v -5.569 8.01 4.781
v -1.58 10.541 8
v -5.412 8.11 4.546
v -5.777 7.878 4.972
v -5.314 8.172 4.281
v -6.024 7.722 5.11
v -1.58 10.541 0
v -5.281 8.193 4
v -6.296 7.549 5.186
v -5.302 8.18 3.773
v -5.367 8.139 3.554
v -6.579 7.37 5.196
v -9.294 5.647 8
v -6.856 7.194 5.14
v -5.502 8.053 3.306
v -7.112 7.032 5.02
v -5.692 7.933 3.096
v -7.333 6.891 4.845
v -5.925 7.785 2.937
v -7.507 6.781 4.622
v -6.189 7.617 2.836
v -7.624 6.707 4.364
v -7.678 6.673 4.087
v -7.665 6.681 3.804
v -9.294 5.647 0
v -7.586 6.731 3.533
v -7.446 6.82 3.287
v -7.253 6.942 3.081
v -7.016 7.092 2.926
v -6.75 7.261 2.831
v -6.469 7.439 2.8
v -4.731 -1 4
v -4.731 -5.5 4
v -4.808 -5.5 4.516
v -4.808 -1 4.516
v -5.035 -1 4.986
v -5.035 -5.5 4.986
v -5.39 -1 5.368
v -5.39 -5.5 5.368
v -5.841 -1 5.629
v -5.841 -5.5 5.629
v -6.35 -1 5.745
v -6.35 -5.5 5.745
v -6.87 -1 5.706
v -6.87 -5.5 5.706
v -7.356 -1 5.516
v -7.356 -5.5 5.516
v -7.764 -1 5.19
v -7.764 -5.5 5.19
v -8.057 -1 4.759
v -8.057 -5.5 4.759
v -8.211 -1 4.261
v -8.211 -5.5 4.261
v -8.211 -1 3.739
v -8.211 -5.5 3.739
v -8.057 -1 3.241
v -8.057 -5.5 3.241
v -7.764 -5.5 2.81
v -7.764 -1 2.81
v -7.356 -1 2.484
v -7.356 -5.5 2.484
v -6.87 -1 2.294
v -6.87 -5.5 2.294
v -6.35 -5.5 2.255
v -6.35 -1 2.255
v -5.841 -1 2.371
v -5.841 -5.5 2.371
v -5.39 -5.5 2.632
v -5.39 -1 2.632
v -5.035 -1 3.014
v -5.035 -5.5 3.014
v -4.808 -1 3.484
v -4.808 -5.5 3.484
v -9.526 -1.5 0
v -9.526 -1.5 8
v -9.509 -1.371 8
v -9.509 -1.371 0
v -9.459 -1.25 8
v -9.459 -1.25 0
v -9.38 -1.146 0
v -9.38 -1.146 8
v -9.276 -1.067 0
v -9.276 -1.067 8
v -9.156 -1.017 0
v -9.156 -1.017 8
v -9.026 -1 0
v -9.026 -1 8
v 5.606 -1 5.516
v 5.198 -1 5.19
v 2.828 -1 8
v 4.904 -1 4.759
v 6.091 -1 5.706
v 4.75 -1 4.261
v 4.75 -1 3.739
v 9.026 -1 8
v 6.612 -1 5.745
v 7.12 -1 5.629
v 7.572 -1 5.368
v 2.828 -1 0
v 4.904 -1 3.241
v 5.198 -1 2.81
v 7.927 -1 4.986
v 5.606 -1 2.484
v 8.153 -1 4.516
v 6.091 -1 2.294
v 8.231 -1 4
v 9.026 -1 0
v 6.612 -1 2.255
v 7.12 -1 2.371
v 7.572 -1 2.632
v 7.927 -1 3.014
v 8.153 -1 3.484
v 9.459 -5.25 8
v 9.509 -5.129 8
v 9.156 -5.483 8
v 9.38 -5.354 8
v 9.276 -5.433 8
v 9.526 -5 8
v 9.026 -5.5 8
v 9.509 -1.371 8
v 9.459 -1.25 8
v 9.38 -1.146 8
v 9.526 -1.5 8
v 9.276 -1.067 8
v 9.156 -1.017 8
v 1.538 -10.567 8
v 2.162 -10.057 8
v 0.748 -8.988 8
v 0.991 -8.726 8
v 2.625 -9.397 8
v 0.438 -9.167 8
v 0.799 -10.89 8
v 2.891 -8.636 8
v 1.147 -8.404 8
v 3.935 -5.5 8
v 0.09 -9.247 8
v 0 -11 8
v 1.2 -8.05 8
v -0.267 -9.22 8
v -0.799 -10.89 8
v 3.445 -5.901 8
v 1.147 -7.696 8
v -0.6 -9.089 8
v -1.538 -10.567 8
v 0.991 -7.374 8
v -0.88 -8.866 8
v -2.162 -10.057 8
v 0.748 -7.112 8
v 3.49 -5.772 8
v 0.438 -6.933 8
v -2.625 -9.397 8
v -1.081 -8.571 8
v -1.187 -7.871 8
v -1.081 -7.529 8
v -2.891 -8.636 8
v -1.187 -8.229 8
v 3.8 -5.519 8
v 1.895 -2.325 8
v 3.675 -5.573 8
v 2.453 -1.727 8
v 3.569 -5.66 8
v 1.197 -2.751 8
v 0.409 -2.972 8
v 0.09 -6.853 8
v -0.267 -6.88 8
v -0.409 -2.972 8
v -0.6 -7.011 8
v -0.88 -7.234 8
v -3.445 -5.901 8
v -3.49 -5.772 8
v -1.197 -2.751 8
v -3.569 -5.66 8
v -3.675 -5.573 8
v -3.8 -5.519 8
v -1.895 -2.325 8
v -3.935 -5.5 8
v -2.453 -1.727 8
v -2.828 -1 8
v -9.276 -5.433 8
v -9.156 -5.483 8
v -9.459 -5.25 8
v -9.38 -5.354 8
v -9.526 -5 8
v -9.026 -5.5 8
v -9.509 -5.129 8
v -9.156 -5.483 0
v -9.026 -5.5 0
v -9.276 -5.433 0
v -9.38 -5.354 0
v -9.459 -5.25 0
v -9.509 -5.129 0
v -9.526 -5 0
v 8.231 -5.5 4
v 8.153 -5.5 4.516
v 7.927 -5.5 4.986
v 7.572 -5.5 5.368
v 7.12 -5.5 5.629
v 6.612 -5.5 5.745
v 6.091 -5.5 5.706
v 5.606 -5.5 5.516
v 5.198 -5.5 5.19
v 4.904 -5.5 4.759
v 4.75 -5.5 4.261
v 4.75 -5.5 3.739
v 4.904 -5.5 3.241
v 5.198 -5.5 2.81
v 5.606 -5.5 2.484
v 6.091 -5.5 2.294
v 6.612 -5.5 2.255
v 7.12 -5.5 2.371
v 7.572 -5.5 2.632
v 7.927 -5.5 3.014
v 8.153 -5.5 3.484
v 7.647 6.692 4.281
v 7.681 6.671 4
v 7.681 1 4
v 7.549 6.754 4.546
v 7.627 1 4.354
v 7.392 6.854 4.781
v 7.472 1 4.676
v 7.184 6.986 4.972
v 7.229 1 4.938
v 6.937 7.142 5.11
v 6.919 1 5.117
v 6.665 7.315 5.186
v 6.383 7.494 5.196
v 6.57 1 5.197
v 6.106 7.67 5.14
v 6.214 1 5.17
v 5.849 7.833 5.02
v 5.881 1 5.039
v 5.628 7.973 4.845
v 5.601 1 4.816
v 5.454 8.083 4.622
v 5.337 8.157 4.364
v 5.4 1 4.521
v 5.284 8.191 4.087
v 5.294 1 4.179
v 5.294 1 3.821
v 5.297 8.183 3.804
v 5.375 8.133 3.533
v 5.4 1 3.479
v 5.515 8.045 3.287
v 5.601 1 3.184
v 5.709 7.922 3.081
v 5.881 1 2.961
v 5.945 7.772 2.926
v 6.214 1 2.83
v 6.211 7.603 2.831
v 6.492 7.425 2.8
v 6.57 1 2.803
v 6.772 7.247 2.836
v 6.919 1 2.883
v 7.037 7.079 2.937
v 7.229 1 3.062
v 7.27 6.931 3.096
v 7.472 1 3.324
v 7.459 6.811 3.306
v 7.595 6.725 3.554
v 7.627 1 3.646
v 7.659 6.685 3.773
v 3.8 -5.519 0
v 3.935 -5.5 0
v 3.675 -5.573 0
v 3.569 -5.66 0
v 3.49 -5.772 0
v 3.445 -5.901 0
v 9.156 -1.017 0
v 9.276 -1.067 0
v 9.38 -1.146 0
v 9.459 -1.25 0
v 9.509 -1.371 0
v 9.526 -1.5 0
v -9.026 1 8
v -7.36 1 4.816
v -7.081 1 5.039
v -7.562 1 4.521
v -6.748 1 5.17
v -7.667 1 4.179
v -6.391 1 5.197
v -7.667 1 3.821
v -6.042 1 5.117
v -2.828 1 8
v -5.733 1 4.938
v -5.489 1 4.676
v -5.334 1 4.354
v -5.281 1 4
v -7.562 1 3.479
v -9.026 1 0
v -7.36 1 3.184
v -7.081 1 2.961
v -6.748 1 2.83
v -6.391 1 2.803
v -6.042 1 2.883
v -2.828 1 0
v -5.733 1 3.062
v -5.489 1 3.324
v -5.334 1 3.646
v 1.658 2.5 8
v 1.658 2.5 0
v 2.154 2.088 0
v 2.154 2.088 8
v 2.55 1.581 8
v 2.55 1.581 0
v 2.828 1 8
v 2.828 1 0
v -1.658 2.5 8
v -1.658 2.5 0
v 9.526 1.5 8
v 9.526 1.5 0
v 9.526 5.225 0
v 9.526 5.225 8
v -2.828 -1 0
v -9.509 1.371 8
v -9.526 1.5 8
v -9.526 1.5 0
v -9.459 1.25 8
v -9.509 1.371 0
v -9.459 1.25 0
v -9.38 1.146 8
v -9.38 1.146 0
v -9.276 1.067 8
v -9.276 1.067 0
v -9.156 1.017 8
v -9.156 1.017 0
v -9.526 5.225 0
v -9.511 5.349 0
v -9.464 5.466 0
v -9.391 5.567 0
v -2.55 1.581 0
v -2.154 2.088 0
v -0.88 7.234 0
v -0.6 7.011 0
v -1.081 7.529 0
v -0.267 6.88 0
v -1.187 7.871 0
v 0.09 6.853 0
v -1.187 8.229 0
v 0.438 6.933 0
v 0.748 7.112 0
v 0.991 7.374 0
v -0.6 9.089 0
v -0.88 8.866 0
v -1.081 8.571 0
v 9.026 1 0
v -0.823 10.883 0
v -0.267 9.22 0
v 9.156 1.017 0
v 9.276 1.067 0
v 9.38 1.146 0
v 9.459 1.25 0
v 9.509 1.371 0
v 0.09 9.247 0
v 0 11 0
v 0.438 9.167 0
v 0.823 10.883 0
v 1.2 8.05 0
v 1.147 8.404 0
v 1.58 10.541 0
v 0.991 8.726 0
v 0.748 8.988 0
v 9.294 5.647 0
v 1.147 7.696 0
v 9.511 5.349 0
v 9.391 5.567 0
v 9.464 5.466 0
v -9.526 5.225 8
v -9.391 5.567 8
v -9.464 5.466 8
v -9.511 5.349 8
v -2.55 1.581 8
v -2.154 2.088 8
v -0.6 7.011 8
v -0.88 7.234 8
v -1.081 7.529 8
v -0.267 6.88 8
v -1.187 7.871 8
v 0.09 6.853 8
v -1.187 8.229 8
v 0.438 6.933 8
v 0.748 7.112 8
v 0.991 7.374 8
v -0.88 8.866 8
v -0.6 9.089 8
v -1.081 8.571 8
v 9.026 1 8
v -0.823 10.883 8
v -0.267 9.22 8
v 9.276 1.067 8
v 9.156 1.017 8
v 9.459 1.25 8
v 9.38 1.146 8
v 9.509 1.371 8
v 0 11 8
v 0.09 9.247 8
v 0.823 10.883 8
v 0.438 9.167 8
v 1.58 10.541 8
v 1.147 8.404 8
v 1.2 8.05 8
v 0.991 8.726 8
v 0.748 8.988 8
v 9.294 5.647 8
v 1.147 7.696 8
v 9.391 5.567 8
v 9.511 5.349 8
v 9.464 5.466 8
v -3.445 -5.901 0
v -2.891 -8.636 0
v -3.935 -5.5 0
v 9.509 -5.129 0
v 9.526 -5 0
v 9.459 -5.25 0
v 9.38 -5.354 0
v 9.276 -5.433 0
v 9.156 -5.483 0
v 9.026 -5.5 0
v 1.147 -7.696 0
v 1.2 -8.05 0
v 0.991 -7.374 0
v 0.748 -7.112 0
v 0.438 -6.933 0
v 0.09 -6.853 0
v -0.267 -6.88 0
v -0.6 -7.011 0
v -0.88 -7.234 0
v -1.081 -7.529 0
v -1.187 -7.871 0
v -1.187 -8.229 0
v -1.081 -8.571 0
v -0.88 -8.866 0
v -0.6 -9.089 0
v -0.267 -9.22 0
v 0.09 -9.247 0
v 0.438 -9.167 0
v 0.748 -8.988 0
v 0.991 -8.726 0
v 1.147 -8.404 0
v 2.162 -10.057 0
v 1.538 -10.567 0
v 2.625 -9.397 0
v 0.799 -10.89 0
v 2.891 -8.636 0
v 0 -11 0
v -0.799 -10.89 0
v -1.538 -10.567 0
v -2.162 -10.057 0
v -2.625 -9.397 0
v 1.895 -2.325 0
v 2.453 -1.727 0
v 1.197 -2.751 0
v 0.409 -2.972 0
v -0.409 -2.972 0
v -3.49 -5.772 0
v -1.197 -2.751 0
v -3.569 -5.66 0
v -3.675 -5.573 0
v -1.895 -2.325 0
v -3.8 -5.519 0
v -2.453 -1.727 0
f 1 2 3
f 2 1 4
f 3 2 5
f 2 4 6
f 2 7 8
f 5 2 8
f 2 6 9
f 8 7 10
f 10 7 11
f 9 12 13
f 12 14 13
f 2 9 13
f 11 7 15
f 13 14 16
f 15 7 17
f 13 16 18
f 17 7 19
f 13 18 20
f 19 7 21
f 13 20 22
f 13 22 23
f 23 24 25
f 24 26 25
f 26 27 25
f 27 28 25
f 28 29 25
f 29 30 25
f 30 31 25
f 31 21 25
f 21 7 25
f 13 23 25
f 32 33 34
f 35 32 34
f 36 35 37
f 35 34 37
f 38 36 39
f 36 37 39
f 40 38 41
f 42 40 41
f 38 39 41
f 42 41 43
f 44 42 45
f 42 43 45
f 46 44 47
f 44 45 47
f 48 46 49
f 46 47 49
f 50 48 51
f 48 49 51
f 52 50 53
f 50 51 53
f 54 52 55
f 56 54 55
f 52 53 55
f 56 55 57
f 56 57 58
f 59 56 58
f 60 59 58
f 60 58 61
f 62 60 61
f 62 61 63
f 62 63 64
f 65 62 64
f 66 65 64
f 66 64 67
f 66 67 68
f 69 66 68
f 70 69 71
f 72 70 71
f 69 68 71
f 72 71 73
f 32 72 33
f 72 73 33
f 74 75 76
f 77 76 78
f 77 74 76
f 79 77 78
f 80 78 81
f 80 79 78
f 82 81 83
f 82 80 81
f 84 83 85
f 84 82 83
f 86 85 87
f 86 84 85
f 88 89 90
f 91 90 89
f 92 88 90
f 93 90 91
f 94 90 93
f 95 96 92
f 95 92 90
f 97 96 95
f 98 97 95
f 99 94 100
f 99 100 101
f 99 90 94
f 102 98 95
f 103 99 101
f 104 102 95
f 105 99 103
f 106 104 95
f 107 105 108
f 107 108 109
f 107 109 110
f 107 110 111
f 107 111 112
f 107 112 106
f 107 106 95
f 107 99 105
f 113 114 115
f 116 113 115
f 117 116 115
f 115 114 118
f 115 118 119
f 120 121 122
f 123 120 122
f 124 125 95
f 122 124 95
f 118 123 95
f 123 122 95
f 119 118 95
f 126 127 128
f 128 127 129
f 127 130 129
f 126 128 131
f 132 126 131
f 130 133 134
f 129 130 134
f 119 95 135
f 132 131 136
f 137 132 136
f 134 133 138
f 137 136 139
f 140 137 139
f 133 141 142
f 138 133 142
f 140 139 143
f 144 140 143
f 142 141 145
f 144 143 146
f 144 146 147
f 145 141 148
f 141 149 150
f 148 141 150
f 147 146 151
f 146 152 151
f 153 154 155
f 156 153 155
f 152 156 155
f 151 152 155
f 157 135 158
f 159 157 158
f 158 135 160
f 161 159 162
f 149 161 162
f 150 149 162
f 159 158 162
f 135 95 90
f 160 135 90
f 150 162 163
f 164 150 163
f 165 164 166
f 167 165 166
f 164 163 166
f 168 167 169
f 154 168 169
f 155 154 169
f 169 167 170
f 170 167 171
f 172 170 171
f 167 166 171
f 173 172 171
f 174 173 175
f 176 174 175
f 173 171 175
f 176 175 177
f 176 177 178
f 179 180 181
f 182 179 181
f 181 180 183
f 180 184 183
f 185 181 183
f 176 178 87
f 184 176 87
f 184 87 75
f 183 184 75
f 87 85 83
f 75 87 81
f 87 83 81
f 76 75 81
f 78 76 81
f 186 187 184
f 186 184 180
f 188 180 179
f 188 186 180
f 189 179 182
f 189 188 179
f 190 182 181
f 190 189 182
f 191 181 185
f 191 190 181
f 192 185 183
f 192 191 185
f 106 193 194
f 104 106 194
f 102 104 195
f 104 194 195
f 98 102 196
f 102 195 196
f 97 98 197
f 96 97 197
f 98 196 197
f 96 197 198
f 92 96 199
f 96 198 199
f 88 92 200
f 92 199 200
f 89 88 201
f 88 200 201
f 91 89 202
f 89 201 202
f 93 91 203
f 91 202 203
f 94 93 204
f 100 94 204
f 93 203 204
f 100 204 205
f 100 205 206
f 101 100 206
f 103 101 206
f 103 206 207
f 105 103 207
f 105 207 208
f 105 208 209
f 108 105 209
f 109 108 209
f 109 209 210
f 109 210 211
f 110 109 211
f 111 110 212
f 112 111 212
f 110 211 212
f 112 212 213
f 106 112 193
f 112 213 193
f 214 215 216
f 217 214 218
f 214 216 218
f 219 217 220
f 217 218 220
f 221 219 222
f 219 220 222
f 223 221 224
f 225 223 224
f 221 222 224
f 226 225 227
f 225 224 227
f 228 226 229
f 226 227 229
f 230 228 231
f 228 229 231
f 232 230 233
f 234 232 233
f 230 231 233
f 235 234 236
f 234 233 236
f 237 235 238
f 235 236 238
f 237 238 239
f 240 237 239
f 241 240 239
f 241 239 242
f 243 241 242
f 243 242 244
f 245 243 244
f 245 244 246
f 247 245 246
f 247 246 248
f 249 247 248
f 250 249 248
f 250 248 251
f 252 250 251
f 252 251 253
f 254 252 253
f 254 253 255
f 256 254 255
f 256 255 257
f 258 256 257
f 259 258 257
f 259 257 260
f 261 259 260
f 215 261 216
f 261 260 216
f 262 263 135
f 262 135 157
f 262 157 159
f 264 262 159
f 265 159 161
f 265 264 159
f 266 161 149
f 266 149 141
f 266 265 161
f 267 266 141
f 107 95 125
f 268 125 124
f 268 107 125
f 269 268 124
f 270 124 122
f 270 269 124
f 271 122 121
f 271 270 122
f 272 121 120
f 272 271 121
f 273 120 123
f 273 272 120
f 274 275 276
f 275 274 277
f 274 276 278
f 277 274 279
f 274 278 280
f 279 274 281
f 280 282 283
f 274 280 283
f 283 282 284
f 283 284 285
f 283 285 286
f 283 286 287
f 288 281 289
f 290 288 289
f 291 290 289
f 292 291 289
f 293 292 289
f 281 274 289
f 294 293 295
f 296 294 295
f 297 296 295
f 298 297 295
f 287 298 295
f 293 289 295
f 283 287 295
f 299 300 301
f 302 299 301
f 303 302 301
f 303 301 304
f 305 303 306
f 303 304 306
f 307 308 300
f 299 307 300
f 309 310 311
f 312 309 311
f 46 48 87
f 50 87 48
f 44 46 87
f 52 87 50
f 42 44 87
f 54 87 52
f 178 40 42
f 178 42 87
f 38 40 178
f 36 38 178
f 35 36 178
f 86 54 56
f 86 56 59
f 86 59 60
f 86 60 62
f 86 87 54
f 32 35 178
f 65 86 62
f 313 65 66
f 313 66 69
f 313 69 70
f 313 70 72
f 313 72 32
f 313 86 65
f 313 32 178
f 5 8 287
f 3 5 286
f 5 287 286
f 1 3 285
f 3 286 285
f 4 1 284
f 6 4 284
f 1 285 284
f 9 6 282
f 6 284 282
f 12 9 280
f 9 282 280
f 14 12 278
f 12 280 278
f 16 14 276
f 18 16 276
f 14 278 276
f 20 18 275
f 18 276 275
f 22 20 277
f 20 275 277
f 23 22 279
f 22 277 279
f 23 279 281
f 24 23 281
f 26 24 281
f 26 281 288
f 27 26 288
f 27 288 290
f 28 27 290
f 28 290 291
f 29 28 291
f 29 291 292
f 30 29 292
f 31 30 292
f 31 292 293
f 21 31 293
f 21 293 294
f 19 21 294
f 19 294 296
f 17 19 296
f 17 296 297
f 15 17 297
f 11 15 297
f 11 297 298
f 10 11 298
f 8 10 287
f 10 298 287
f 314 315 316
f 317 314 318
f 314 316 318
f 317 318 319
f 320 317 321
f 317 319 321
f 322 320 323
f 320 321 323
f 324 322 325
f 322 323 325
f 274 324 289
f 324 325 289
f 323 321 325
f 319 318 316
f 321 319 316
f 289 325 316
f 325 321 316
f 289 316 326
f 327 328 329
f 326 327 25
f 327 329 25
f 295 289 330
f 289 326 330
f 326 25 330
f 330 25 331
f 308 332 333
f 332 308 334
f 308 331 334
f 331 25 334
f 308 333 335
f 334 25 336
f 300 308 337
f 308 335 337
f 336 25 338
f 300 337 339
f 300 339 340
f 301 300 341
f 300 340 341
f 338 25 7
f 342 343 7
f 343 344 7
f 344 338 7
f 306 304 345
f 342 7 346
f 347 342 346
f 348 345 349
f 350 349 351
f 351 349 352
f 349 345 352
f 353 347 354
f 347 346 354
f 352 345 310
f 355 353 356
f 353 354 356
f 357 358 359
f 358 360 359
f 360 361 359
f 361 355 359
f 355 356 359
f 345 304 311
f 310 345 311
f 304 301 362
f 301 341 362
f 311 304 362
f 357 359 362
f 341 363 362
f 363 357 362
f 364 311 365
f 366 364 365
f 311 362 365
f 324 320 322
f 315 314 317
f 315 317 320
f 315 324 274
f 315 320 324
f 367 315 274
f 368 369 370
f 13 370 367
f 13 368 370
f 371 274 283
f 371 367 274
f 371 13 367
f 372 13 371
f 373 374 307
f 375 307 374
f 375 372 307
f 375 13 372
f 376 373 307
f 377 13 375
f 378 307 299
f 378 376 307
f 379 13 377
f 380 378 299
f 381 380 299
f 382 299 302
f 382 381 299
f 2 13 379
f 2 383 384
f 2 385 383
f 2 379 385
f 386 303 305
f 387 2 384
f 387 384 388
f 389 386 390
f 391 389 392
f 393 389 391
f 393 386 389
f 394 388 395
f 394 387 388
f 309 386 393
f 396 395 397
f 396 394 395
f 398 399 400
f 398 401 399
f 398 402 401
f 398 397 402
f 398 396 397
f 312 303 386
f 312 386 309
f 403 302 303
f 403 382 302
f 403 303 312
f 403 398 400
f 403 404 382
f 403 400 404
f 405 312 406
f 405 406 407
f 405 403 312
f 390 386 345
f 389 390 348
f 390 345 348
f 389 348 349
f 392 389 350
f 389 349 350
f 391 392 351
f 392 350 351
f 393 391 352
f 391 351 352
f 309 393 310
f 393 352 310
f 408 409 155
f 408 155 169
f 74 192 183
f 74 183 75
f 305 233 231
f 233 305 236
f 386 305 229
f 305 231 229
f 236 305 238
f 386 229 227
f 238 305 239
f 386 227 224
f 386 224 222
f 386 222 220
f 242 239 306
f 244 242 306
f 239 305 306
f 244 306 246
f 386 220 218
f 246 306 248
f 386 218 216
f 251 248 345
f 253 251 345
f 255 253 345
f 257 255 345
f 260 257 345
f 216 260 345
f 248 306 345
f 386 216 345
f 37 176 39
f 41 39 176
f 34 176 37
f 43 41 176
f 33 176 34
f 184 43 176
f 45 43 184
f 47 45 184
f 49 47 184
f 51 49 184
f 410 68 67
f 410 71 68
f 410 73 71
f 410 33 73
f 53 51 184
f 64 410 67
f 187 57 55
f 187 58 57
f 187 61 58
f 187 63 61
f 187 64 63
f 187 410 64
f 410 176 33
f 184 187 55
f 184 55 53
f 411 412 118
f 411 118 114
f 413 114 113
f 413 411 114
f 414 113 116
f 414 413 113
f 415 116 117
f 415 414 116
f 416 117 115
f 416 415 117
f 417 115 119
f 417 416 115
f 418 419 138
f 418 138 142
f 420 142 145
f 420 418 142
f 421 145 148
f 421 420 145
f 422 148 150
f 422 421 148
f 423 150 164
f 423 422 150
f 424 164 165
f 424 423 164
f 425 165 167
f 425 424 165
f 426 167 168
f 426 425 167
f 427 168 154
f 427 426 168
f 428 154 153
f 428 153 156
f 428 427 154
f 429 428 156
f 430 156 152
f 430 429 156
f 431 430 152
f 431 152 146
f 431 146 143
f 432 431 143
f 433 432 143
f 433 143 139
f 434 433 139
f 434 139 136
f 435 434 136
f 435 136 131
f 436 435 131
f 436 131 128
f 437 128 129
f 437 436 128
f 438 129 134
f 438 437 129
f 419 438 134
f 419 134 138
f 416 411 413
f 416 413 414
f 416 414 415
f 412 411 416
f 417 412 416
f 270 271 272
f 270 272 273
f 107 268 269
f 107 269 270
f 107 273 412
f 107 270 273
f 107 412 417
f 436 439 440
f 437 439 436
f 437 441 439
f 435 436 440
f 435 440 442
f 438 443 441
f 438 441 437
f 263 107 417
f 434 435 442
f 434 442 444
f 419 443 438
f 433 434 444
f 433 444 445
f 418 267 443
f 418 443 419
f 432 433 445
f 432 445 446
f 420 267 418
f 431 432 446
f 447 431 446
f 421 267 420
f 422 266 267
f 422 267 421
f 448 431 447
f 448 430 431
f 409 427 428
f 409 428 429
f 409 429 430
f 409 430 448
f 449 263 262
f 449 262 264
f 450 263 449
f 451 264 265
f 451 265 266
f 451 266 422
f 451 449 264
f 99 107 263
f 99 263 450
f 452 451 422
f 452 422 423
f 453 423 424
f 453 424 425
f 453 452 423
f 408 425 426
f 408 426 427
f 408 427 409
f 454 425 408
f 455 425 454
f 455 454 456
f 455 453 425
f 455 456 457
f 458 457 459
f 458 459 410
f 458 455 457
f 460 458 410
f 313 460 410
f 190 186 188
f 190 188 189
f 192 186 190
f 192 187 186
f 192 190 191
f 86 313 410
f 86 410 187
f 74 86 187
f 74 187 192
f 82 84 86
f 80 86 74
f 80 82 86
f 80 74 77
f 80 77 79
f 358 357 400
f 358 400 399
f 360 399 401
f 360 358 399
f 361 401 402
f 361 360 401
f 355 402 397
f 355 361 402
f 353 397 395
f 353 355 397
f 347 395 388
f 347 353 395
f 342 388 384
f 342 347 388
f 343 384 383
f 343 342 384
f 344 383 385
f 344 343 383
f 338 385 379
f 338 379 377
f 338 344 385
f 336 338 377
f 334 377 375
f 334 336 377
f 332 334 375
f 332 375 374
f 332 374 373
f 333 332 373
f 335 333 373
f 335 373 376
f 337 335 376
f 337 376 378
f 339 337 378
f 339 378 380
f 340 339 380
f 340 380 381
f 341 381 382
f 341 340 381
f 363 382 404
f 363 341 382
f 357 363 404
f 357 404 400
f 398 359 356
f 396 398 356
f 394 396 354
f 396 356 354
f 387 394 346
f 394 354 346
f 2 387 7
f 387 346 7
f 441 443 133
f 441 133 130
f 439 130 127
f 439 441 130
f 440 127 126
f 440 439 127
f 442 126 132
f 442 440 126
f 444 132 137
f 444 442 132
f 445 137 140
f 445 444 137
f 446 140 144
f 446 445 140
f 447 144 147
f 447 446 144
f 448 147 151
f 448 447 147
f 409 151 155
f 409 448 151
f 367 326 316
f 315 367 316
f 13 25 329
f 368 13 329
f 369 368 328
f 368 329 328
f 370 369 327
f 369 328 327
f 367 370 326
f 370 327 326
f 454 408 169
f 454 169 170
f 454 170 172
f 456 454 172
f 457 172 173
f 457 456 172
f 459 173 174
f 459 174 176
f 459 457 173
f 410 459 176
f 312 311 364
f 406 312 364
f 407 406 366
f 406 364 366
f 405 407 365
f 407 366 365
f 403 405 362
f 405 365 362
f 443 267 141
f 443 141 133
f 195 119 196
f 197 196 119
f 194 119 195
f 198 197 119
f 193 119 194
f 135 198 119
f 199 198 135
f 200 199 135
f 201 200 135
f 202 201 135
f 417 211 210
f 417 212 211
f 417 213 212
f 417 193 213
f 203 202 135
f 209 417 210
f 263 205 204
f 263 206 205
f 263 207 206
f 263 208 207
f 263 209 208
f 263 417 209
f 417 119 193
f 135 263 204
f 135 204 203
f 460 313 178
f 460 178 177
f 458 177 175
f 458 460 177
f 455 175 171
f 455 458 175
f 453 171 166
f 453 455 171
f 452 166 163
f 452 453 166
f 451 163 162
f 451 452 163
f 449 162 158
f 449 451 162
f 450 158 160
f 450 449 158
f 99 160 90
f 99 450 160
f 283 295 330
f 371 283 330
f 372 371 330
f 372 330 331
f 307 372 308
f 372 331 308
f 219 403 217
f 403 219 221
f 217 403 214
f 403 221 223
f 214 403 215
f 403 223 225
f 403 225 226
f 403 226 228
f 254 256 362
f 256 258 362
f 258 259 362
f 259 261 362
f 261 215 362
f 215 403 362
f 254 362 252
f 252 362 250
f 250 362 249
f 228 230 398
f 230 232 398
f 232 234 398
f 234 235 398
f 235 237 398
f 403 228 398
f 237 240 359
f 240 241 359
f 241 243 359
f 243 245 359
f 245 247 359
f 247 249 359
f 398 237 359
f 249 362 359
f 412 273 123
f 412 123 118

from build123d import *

# Parameters (mm, degrees)
SKETCH_1_R          = 1.2
EXTRUDE_1_DEPTH     = 8
EXTRUDE_1_2_DEPTH   = 8
SKETCH_2_R          = 1.2
CUT_EXTRUDE_1_DEPTH = 17.5
SKETCH_3_R          = 1.75
CUT_EXTRUDE_2_DEPTH = 4.5


with BuildPart() as part:
    # 草图1 → 凸台-拉伸1 (new body)
    with BuildSketch(Plane.XY):
        with BuildLine():
            Line((-1.658312395, 2.5), (1.658312395, 2.5))
            ThreePointArc((1.658312395, 2.5), (2.365419176, 1.84520788), (2.828427125, 1))
            Line((2.828427125, 1), (9.026279442, 1))
            ThreePointArc((9.026279442, 1), (9.379832832, 1.146446609), (9.526279442, 1.5))
            Line((9.526279442, 1.5), (9.526279442, 5.22507425))
            ThreePointArc((9.526279442, 5.22507425), (9.464414867, 5.465983671), (9.294130046, 5.647278056))
            Line((9.294130046, 5.647278056), (1.580318565, 10.541002455))
            ThreePointArc((1.580318565, 10.541002455), (0, 11), (-1.580318565, 10.541002455))
            Line((-1.580318565, 10.541002455), (-9.294130046, 5.647278056))
            ThreePointArc((-9.294130046, 5.647278056), (-9.464414867, 5.465983671), (-9.526279442, 5.22507425))
            Line((-9.526279442, 5.22507425), (-9.526279442, 1.5))
            ThreePointArc((-9.526279442, 1.5), (-9.379832832, 1.146446609), (-9.026279442, 1))
            Line((-9.026279442, 1), (-2.828427125, 1))
            ThreePointArc((-2.828427125, 1), (-2.365419176, 1.84520788), (-1.658312395, 2.5))
        make_face()
        with Locations((0, 8.05)):
            Circle(SKETCH_1_R, mode=Mode.SUBTRACT)
    extrude(amount=EXTRUDE_1_DEPTH)


with BuildPart() as body_2:
    # 草图1 → Extrude 1 2 (new body)
    with BuildSketch(Plane.XY):
        with BuildLine():
            Line((-9.026279442, -1), (-2.828427125, -1))
            ThreePointArc((-2.828427125, -1), (0, -3), (2.828427125, -1))
            Line((2.828427125, -1), (9.026279442, -1))
            ThreePointArc((9.026279442, -1), (9.379832832, -1.146446609), (9.526279442, -1.5))
            Line((9.526279442, -1.5), (9.526279442, -5))
            ThreePointArc((9.526279442, -5), (9.379832832, -5.353553391), (9.026279442, -5.5))
            Line((9.026279442, -5.5), (3.935174447, -5.5))
            ThreePointArc((3.935174447, -5.5), (3.6186464, -5.612947037), (3.445121974, -5.900760016))
            Line((3.445121974, -5.900760016), (2.891309587, -8.635515904))
            ThreePointArc((2.891309587, -8.635515904), (0, -11), (-2.891309587, -8.635515904))
            Line((-2.891309587, -8.635515904), (-3.445121974, -5.900760016))
            ThreePointArc((-3.445121974, -5.900760016), (-3.6186464, -5.612947037), (-3.935174447, -5.5))
            Line((-3.935174447, -5.5), (-9.026279442, -5.5))
            ThreePointArc((-9.026279442, -5.5), (-9.379832832, -5.353553391), (-9.526279442, -5))
            Line((-9.526279442, -5), (-9.526279442, -1.5))
            ThreePointArc((-9.526279442, -1.5), (-9.379832832, -1.146446609), (-9.026279442, -1))
        make_face()
        with Locations((0, -8.05)):
            Circle(SKETCH_1_R, mode=Mode.SUBTRACT)
    extrude(amount=EXTRUDE_1_2_DEPTH)


with BuildPart() as cut_extrude_1_tool:
    # 草图2 → 切除-拉伸1 (new body, through all)
    with BuildSketch(Plane.XZ.offset(5.5)):
        with Locations((6.480726944, 4)):
            Circle(SKETCH_2_R)
        with Locations((-6.480726944, 4)):
            Circle(SKETCH_2_R)
    extrude(amount=-CUT_EXTRUDE_1_DEPTH)


with BuildPart() as part_1:
    add(part.part)

    # 切除-拉伸1: cut by cut_extrude_1_tool
    add(cut_extrude_1_tool.part, mode=Mode.SUBTRACT)


with BuildPart() as body_2_1:
    add(body_2.part)

    # 切除-拉伸1: cut by cut_extrude_1_tool
    add(cut_extrude_1_tool.part, mode=Mode.SUBTRACT)

    # 草图3 → 切除-拉伸2 (cut)
    with BuildSketch(Plane.XZ.offset(5.5)):
        with Locations((-6.480726944, 4)):
            Circle(SKETCH_3_R)
        with Locations((6.480726944, 4)):
            Circle(SKETCH_3_R)
    extrude(amount=-CUT_EXTRUDE_2_DEPTH, mode=Mode.SUBTRACT)


solid = Compound([part_1.part, body_2_1.part])
